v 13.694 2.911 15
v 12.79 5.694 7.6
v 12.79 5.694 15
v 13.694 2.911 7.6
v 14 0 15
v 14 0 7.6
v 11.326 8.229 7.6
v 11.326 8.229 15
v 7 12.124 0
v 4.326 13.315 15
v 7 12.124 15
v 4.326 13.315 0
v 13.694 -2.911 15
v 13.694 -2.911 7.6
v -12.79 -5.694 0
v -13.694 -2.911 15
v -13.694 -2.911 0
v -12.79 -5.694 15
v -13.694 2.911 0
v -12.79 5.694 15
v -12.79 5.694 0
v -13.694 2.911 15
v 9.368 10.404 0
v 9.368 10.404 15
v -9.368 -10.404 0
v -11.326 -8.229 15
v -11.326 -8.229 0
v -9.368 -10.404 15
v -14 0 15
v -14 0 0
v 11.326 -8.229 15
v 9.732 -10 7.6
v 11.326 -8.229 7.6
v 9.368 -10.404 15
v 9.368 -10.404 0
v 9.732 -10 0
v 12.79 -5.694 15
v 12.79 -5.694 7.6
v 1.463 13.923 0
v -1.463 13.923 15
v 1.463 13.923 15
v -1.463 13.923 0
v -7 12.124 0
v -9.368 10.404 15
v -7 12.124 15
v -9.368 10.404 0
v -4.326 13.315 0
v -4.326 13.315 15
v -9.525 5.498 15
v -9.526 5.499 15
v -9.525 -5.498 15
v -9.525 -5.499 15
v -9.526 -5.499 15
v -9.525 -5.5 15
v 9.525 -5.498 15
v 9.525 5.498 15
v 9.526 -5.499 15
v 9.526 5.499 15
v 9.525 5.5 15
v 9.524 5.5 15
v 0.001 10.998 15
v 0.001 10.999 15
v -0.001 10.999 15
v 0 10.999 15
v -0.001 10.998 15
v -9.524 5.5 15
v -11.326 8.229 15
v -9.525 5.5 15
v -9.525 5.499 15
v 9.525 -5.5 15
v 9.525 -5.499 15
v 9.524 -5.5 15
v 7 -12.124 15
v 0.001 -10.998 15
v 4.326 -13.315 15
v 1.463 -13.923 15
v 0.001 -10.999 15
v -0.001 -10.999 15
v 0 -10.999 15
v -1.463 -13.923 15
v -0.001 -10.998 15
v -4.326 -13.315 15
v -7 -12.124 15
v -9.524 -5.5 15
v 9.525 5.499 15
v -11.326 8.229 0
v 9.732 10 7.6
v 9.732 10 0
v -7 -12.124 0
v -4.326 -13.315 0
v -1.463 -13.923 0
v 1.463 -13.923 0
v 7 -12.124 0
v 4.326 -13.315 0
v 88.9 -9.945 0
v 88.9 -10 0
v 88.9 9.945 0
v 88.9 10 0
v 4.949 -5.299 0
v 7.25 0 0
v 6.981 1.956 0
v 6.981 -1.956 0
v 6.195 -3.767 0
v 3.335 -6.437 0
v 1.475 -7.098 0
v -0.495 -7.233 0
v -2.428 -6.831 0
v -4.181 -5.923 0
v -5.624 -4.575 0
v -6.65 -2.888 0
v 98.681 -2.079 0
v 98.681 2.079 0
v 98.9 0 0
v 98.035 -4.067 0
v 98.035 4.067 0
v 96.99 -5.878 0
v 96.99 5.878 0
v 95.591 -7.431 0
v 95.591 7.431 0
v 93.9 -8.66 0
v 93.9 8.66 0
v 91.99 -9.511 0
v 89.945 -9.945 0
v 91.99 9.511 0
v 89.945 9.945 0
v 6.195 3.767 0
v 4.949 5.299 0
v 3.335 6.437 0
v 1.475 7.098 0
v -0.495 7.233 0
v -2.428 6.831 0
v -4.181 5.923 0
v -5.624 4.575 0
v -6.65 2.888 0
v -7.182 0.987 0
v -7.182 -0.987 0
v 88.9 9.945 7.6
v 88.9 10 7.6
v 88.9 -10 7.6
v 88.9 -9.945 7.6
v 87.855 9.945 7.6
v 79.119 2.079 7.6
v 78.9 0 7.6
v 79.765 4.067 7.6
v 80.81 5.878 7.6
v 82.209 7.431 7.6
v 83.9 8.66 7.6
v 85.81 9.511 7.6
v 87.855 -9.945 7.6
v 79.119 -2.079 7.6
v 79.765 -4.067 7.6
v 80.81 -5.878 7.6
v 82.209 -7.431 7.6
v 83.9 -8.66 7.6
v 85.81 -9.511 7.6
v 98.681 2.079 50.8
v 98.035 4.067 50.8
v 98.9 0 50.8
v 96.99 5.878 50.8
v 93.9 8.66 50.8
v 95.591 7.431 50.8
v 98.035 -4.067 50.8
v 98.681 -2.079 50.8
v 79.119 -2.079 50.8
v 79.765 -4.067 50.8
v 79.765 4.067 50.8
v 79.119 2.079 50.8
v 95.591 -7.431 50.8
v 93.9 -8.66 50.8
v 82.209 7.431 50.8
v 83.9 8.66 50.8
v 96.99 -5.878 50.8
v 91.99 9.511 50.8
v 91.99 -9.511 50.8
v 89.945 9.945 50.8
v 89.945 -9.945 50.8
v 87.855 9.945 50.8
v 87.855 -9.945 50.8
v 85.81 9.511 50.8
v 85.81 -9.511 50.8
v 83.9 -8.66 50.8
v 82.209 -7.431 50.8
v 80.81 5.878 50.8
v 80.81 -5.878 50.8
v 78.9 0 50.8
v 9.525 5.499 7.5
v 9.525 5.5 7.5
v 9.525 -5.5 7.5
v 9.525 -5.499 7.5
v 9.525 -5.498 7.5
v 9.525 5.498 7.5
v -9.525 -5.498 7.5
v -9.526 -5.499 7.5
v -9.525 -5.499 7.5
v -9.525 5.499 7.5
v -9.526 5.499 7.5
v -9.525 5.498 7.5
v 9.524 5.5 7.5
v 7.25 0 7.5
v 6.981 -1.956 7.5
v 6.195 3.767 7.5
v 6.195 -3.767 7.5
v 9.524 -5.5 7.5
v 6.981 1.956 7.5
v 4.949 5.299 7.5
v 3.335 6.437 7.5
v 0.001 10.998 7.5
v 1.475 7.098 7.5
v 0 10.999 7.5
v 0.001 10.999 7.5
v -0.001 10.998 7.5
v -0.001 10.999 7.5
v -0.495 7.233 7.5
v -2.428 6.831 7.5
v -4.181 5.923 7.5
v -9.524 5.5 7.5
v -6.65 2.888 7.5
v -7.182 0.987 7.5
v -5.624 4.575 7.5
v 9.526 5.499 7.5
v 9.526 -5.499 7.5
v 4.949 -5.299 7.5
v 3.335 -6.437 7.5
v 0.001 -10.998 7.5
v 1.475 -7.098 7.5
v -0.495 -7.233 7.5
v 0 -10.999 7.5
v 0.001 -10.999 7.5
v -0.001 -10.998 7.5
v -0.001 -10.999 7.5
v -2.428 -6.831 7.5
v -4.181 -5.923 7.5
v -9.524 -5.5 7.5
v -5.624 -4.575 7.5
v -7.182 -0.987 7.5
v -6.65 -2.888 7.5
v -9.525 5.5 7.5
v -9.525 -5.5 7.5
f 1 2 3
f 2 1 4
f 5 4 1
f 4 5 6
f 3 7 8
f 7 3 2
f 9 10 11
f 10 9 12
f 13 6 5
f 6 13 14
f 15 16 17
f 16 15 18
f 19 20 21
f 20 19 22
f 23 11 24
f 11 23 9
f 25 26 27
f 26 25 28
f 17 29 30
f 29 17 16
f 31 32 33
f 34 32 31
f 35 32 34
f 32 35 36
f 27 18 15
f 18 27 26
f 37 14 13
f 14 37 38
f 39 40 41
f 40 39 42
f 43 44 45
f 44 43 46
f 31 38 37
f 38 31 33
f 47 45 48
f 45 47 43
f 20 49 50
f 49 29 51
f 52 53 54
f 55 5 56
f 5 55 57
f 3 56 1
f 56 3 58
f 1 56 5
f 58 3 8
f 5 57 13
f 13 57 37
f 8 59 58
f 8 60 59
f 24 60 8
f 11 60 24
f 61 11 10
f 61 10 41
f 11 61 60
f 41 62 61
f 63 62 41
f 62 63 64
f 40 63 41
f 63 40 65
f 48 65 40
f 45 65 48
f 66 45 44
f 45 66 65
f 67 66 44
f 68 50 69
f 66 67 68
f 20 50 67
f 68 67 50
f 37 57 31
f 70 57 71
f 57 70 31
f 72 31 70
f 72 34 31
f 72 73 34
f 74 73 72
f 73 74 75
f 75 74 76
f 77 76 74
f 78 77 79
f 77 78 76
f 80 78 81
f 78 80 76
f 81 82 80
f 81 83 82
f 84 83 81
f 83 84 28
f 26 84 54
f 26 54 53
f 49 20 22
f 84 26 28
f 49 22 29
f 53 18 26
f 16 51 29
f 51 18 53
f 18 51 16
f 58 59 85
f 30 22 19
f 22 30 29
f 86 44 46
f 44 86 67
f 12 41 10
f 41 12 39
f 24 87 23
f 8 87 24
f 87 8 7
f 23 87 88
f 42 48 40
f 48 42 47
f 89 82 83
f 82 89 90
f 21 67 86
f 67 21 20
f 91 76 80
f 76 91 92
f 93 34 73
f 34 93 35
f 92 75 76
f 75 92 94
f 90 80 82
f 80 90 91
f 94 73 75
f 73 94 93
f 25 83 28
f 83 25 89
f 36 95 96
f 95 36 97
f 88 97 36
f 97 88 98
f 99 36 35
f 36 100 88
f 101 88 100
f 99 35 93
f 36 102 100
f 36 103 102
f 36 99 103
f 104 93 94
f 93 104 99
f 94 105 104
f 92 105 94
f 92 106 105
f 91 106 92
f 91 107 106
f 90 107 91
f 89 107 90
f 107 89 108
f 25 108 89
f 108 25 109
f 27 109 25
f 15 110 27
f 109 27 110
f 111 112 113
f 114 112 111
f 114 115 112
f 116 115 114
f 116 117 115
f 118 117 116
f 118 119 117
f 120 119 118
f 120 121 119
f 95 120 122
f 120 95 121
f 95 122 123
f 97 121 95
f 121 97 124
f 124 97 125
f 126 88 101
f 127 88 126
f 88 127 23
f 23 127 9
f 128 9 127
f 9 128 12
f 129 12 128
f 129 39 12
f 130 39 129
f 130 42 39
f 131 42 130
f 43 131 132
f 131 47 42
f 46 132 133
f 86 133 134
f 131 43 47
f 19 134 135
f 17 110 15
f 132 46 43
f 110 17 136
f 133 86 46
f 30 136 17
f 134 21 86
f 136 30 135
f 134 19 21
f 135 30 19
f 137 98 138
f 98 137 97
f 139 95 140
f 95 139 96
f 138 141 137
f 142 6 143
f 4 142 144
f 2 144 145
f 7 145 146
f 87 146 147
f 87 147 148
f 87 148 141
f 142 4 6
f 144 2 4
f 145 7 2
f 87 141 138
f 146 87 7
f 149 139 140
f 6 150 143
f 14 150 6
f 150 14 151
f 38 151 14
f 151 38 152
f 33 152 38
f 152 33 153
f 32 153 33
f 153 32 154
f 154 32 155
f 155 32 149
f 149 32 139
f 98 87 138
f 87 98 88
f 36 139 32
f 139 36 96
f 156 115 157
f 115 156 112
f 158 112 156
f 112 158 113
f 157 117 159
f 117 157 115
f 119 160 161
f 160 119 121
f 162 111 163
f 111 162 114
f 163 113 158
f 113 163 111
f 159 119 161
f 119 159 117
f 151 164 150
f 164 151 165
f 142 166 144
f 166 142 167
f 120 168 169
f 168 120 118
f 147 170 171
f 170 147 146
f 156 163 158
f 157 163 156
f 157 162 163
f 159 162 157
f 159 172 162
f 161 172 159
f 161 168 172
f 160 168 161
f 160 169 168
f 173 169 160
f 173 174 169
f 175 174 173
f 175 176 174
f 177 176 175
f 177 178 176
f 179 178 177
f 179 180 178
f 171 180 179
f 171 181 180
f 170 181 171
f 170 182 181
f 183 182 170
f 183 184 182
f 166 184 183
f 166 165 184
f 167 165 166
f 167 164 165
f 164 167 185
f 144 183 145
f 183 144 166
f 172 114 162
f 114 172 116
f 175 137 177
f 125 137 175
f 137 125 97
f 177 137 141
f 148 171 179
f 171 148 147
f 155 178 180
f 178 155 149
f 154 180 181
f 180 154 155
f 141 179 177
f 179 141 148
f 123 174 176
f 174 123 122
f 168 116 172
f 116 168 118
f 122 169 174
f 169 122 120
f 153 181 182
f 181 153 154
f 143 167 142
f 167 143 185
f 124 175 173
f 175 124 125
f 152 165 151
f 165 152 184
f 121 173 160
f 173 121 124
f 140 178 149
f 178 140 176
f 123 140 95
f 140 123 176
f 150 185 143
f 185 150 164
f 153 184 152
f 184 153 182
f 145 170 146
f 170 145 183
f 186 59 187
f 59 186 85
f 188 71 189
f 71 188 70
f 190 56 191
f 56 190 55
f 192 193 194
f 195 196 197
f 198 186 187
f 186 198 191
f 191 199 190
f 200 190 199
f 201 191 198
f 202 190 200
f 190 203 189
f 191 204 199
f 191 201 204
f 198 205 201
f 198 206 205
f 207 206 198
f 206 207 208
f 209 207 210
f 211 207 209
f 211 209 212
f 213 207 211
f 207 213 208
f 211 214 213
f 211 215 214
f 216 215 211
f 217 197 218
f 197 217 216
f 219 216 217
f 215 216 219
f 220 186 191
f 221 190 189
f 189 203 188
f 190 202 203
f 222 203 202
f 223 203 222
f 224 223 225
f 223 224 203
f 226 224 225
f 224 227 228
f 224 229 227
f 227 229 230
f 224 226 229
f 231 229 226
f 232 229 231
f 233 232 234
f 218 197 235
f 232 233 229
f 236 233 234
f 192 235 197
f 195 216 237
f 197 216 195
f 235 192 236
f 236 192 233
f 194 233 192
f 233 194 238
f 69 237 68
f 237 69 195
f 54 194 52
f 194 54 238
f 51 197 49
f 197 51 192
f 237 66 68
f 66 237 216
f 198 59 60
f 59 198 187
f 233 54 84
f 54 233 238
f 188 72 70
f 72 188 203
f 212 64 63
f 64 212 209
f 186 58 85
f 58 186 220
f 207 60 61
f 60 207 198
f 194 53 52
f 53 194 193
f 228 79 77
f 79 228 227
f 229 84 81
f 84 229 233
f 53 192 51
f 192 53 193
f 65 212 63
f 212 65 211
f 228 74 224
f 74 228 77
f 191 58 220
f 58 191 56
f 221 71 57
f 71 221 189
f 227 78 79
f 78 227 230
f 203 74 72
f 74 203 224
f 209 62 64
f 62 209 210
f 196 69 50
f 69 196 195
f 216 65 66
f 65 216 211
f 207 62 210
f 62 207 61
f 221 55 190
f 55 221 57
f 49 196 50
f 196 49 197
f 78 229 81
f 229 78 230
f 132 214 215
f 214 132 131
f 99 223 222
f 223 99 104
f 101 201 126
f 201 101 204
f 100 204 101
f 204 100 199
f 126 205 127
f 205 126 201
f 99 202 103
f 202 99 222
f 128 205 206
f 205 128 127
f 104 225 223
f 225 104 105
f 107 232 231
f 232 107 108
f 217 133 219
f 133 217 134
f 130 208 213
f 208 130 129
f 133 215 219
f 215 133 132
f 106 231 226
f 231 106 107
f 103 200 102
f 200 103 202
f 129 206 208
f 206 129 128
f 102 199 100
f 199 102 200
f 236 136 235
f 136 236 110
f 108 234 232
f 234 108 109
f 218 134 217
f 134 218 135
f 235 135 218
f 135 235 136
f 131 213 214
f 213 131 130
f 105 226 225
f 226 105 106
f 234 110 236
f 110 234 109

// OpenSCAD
wtotal=1.5*25.4*0.5;
wface=11.;
h=7.6;
whandle=20;
lhandle=3.5*25.4;
dhandle=20;
hhandle=2.*25.4;
module nut(){
rotate([0,0,0])
translate([0,0,0])
cube([wtotal,wface,h],center=true);

rotate([0,0,60])
cube([wtotal,wface,h],center=true);

rotate([0,0,-60])
cube([wtotal,wface,h],center=true);}

module handle(){
cylinder(15,d=28);
translate([0,-whandle/2,0])
cube([lhandle,whandle,h]);
translate([lhandle,0,0])
cylinder(hhandle,d=dhandle);
}

difference(){
handle();
translate([0,0,0.1+15-h+h/2])
nut();
cylinder(50,d=14.5, center=true);
}
